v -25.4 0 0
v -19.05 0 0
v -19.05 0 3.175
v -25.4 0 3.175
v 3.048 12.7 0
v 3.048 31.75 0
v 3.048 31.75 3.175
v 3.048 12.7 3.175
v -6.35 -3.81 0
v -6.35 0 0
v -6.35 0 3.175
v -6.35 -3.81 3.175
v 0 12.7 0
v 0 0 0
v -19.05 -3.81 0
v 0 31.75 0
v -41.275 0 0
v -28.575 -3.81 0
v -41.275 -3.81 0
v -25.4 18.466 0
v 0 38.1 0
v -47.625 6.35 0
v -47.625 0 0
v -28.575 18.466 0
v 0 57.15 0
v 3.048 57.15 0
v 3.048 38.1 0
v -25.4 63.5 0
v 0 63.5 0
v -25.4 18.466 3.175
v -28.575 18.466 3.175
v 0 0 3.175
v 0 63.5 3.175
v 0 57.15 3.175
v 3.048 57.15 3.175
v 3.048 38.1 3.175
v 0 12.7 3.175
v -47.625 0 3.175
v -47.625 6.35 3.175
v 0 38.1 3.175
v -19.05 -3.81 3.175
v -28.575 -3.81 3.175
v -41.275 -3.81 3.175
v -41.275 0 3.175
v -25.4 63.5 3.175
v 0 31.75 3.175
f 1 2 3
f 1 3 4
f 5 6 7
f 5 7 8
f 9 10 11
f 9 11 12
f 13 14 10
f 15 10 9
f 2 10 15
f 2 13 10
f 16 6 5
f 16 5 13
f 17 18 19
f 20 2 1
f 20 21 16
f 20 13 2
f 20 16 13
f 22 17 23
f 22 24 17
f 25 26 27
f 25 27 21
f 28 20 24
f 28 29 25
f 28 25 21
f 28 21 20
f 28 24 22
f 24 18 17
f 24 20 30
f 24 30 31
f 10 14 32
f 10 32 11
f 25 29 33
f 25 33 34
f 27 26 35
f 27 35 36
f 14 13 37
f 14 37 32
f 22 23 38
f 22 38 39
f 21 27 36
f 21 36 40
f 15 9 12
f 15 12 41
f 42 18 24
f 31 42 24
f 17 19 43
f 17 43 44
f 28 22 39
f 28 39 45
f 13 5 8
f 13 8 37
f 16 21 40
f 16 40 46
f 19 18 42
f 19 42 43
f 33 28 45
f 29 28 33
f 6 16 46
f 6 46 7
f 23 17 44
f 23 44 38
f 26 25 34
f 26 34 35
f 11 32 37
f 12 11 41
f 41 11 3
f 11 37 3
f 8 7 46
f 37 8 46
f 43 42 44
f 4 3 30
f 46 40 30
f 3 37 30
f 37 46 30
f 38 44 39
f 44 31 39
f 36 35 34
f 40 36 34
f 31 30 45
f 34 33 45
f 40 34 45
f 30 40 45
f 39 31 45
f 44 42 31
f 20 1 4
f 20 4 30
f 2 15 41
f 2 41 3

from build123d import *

# Parameters (mm, degrees)
BOSS_EXTRUDE1_DEPTH = 3.175
KERF_DEPTH          = 3.175


with BuildPart() as part:
    # Sketch1 → Boss-Extrude1 (new body)
    with BuildSketch(Plane.XY):
        Polygon((0, 0), (-6.35, 0), (-6.35, -3.81), (-19.05, -3.81), (-19.05, 0), (-25.4, 0), (-25.4, 18.4658), (-28.575, 18.4658), (-28.575, 0), (-28.575, -3.81), (-41.275, -3.81), (-41.275, 0), (-47.625, 0), (-47.625, 6.35), (-25.4, 63.5), (0, 63.5), (0, 57.15), (3.048, 57.15), (3.048, 38.1), (0, 38.1), (0, 31.75), (3.048, 31.75), (3.048, 12.7), (0, 12.7), align=None)
    extrude(amount=BOSS_EXTRUDE1_DEPTH)

    # Sketch2 → kerf (add, through all)
    with BuildSketch(Plane.XY.offset(3.175)):
        Polygon((-25.4, 0), (-19.05, 0), (-19.05, -3.81), (-6.35, -3.81), (-6.35, 0), (0, 0), (0, 12.7), (3.048, 12.7), (3.048, 31.75), (0, 31.75), (0, 38.1), (3.048, 38.1), (3.048, 57.15), (0, 57.15), (0, 63.5), (-25.4, 63.5), (-47.625, 6.35), (-47.625, 0), (-41.275, 0), (-41.275, -3.81), (-28.575, -3.81), (-28.575, 18.4658), (-25.4, 18.4658), align=None)
    extrude(amount=-KERF_DEPTH)


solid = part.part
